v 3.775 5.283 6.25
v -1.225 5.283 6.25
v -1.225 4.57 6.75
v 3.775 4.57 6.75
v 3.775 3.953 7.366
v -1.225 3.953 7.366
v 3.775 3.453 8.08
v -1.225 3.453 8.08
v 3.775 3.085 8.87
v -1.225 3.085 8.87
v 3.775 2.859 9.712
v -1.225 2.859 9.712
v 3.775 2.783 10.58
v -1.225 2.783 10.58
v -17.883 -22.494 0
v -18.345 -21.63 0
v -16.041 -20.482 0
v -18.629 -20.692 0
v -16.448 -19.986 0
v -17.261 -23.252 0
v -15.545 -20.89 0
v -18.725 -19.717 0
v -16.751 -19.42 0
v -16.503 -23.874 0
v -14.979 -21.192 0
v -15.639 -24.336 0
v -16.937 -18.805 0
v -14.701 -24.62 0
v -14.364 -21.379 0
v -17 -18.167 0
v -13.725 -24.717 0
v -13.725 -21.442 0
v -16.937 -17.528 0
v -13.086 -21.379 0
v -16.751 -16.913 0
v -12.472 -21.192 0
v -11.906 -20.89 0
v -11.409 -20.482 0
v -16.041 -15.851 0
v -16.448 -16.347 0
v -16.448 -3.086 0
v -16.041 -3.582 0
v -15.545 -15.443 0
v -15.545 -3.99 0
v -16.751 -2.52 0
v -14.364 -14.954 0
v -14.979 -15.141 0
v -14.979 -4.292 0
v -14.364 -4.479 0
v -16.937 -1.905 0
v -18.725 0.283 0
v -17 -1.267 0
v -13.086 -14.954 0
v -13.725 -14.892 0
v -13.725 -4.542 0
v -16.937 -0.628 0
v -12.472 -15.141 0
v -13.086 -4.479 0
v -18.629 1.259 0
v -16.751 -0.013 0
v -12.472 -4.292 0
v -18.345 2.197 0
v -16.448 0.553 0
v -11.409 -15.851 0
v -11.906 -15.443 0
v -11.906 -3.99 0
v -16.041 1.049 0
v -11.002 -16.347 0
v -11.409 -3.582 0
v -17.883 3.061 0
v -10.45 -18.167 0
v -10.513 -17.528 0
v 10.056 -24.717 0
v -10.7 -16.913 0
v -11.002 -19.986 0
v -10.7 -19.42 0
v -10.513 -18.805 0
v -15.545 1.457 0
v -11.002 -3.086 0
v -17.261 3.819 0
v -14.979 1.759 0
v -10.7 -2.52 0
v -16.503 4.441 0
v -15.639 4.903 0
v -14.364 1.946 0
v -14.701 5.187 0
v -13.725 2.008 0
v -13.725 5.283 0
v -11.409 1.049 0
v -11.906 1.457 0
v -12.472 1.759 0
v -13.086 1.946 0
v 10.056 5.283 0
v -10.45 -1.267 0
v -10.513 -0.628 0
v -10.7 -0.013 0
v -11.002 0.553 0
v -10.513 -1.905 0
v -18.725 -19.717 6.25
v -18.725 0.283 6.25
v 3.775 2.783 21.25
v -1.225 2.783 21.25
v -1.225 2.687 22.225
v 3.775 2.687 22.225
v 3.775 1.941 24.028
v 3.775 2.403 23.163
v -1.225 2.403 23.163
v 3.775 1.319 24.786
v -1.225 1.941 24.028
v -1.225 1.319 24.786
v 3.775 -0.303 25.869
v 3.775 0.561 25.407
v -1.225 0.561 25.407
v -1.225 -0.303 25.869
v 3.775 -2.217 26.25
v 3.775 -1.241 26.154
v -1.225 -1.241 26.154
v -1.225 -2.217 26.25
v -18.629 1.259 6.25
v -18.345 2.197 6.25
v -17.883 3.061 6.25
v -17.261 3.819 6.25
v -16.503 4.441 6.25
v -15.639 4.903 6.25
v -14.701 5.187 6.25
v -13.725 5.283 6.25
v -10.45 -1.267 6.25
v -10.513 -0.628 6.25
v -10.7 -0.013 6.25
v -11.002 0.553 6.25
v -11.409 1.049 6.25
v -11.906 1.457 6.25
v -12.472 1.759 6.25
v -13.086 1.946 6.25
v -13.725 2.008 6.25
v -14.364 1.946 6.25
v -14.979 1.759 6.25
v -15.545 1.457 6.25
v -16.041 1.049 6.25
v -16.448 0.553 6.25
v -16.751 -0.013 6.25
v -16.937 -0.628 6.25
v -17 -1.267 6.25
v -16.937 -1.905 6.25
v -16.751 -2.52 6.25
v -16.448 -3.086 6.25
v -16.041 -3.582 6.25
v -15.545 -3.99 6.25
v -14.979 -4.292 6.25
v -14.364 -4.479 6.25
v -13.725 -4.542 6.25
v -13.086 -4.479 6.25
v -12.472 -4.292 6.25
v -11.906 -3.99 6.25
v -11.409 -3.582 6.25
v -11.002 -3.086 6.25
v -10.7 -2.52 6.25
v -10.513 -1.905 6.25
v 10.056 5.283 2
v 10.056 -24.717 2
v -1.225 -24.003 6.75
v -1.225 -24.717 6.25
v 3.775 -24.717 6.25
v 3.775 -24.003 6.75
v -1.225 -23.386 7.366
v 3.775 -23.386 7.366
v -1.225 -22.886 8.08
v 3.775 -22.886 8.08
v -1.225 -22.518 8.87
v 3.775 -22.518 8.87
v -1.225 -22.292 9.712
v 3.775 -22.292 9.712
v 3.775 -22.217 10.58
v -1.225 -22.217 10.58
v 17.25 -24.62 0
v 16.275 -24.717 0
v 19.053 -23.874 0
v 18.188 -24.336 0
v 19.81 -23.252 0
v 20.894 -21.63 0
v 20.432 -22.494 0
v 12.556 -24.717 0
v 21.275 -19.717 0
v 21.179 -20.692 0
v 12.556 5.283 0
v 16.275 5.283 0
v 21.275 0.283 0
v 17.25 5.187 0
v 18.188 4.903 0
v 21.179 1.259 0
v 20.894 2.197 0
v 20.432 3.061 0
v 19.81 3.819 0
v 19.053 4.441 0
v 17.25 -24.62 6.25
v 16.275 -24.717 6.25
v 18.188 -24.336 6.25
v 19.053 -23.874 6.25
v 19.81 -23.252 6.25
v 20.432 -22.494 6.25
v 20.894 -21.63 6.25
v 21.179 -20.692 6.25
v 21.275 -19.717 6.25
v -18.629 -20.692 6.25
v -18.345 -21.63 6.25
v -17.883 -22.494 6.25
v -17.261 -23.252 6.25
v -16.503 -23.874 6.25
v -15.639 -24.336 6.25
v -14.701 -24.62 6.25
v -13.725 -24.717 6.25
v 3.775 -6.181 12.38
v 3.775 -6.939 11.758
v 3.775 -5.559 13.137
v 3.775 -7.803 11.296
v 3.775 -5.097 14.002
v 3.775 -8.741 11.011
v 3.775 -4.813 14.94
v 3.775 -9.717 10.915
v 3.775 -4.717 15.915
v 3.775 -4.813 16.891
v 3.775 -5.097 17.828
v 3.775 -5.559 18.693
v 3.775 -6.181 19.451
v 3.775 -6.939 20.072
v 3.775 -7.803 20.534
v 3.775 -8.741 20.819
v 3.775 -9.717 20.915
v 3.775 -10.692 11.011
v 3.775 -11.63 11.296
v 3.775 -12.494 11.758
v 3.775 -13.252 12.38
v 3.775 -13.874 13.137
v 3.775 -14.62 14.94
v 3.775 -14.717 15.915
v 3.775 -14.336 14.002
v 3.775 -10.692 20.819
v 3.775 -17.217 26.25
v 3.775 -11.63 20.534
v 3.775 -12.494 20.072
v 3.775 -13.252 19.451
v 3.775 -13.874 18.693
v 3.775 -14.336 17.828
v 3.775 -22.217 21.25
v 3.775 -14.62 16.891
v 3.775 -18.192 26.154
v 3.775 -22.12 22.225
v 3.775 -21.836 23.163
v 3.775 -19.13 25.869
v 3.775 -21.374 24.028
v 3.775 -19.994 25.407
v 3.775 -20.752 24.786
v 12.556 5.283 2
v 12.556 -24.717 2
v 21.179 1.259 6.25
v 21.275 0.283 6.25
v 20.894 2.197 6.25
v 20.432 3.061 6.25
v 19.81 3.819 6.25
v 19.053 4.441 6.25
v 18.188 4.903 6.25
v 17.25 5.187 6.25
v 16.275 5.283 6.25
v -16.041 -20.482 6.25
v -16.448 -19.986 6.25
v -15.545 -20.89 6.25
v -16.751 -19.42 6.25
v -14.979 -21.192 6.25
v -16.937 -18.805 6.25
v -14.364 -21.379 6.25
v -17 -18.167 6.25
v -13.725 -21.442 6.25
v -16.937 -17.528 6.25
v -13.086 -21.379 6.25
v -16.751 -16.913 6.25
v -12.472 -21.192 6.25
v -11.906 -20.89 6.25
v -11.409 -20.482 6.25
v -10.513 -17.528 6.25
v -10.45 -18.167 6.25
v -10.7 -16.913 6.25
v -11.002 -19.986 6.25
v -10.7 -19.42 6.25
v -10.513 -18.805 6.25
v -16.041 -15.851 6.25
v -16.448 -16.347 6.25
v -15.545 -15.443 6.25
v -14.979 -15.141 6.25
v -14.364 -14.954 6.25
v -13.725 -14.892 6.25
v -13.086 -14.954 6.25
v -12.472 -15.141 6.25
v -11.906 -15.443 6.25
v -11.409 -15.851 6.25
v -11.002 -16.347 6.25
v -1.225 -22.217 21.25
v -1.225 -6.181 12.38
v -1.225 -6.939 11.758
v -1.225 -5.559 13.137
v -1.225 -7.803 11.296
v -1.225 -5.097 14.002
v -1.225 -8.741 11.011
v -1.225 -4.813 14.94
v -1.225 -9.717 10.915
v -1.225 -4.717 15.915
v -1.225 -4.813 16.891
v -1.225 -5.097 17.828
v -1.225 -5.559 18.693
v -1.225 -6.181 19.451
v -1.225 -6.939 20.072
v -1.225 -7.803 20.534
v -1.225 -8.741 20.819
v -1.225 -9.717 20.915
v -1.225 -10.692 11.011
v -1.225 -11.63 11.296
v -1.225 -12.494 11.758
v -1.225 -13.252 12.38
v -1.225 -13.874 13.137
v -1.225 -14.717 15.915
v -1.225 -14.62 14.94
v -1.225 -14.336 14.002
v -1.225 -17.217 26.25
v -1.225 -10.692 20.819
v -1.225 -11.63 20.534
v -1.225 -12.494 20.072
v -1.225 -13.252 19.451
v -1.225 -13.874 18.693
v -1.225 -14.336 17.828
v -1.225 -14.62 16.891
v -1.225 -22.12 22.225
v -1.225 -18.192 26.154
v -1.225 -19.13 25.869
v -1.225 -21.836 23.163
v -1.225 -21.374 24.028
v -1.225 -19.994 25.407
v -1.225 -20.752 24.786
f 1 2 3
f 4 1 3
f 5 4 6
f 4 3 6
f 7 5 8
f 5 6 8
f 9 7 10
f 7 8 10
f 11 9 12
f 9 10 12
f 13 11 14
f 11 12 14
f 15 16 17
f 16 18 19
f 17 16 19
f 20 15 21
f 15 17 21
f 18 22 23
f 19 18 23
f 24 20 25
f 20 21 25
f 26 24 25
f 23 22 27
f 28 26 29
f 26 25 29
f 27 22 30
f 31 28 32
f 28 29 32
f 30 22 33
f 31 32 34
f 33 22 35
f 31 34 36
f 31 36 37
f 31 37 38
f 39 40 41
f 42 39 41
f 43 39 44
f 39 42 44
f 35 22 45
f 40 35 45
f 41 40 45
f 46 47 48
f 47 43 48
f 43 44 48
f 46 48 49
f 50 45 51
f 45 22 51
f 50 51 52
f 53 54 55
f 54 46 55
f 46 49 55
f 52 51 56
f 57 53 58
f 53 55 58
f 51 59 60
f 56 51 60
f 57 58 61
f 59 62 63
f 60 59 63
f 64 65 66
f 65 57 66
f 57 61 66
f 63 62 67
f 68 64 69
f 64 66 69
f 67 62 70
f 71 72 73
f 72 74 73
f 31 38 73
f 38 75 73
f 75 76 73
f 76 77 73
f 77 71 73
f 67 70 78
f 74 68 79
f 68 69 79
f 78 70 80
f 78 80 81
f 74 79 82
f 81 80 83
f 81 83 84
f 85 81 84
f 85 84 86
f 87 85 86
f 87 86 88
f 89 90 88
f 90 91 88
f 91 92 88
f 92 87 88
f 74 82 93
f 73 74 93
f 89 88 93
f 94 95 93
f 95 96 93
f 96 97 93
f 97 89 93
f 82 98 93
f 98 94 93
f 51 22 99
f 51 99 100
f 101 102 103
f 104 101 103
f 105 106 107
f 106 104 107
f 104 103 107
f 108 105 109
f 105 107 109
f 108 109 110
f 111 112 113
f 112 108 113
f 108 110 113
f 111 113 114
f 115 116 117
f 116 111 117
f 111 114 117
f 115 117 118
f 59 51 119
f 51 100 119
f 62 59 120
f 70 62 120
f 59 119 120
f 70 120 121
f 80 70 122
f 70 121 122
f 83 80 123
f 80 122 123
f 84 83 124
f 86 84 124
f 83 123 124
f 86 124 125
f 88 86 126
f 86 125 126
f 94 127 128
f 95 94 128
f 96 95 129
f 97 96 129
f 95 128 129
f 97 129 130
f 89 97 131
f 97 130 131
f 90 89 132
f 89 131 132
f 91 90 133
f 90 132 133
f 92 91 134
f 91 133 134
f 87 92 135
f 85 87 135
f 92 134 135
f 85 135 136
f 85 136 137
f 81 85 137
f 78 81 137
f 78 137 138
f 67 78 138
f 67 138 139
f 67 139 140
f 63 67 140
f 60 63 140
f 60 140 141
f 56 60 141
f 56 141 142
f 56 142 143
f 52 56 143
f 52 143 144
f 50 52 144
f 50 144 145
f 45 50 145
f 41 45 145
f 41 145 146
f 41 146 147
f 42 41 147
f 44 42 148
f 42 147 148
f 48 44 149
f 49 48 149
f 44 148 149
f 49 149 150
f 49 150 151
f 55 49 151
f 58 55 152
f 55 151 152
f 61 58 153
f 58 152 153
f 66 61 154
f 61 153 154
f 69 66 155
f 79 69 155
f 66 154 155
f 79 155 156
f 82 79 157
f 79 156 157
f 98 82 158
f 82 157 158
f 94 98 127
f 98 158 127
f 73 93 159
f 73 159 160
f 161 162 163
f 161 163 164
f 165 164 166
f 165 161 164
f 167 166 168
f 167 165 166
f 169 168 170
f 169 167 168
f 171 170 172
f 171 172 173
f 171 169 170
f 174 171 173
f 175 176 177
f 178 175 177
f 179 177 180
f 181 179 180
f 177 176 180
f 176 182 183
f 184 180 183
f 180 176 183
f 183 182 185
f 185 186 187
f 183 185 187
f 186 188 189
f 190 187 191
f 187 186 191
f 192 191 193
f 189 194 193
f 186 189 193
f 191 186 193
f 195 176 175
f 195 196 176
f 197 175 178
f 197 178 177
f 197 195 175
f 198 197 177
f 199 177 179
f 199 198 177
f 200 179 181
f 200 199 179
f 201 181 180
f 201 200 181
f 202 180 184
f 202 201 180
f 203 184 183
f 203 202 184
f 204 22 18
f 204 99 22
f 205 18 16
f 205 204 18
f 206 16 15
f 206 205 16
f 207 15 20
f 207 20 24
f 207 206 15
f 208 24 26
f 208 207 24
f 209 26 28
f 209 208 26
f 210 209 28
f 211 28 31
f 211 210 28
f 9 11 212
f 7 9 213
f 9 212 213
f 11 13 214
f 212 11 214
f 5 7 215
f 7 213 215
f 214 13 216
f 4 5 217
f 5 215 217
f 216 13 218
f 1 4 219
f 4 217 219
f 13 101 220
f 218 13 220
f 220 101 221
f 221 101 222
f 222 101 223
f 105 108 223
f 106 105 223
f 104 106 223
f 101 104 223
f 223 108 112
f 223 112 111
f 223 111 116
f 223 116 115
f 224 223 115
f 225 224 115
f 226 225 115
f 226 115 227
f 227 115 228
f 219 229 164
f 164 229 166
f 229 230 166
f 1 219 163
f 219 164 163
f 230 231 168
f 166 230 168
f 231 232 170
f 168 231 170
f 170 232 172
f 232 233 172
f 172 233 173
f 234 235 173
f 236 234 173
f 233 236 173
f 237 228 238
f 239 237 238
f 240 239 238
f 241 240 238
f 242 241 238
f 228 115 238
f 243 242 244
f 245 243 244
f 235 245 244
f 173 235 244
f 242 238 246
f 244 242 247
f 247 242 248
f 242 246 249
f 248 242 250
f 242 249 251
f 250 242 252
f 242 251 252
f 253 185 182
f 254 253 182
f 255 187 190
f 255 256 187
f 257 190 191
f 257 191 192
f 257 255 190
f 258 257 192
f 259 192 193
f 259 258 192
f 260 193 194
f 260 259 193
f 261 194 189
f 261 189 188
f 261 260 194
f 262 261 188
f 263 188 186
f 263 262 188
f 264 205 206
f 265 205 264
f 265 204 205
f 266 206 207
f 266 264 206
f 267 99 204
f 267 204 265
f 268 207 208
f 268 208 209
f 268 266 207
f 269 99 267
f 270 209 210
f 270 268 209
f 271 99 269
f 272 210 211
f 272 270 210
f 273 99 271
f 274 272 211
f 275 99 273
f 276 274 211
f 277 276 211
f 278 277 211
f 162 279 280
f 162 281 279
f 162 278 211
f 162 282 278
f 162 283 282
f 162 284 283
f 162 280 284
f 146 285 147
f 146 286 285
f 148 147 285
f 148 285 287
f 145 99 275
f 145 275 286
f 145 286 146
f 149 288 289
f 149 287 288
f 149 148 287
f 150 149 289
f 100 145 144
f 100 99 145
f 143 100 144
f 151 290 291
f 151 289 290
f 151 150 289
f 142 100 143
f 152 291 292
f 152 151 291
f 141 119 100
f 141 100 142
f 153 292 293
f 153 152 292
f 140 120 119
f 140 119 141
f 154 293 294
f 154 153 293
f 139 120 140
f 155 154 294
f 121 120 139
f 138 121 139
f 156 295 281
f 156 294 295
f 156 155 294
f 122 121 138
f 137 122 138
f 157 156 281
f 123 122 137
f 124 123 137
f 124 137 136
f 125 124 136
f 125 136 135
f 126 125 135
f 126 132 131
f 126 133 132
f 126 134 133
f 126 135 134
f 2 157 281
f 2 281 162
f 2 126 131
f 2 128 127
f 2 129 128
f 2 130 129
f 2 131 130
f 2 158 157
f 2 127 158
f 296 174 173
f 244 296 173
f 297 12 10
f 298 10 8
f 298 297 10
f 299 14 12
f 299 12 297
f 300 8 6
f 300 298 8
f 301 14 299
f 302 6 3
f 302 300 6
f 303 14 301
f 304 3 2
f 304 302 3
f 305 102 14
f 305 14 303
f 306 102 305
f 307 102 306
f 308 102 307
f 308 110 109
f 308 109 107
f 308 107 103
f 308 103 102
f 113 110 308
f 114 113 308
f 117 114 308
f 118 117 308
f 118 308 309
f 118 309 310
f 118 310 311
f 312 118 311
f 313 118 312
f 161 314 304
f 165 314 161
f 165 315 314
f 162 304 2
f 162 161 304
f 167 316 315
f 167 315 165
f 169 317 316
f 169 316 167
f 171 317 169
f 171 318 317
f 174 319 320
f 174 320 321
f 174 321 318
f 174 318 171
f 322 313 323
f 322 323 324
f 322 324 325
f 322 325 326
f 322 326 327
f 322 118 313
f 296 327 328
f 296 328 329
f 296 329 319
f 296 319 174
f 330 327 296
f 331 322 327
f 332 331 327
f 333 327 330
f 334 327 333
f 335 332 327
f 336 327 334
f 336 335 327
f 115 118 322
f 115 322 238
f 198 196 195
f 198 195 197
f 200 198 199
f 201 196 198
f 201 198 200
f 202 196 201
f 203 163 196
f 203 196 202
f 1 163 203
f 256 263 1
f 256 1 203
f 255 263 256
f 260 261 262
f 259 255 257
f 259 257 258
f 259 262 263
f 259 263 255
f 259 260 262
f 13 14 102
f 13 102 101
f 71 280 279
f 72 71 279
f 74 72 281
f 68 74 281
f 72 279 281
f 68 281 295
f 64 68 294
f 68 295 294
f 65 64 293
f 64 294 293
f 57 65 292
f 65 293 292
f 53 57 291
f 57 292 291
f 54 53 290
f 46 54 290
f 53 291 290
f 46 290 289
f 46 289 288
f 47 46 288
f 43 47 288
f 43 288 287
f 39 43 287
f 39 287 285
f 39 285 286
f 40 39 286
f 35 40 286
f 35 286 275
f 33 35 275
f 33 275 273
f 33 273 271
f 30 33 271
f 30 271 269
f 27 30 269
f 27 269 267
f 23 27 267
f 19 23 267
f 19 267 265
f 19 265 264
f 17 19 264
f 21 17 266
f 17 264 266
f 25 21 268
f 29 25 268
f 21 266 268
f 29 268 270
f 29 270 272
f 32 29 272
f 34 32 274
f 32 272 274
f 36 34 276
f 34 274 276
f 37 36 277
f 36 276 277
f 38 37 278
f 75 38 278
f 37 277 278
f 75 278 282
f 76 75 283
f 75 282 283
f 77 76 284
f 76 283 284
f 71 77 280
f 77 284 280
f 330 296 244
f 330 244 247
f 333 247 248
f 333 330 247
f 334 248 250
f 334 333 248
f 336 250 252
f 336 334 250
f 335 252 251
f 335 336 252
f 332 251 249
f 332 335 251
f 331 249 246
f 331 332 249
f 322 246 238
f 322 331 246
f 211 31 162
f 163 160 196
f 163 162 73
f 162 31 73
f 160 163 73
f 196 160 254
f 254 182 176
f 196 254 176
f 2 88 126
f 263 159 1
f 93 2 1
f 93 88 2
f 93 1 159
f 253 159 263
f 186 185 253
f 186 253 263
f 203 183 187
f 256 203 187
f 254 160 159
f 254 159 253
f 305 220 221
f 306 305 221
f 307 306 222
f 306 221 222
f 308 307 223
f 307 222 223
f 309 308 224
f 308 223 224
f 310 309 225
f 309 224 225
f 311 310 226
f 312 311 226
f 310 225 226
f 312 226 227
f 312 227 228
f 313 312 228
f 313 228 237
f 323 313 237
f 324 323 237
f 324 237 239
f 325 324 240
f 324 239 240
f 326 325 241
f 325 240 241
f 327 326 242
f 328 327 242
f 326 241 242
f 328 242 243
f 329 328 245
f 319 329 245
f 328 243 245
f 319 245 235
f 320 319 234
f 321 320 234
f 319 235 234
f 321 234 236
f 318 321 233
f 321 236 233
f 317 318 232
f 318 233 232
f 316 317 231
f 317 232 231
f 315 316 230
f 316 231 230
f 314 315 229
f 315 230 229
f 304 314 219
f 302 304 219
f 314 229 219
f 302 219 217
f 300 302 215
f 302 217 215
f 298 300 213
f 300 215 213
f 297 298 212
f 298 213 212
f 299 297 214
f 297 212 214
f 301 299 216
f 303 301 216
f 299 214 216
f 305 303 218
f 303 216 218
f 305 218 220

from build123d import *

# Parameters (mm, degrees)
F0_W        = 40
F0_H        = 30
F1_DEPTH    = 6.25
F2_R        = 5
F3_W        = 5
F3_H        = 25
F4_DEPTH    = 20
F5_T1_DEPTH = 5
F5_T3_DEPTH = 5
F5_T5_DEPTH = 30
F5_T7_DEPTH = 30
F7_R        = 5
F8_DEPTH    = 5
F6_R        = 3.275
F9_DEPTH    = 25
F10_W       = 2.5
F10_H       = 30
F11_DEPTH   = 2


# Not quite as in the source:
# - a fillet or chamfer that OpenCascade refuses, or shapes differently, is made with other operations: its cross-section is extruded or revolved along the edge and cut away or added


with BuildPart() as f1:
    # F0 (on Top) → F1 (new body)
    with BuildSketch(Plane.XY):
        with Locations((1.2747282162, -9.7165126197)):
            Rectangle(F0_W, F0_H)
    extrude(amount=F1_DEPTH)

    # F2
    f2_edges = [f1.edges().sort_by_distance(p)[0] for p in [
        (-18.725272, -24.716513, 3.125),
        (21.274728, -24.716513, 3.125),
        (21.274728, 5.283487, 3.125),
        (-18.725272, 5.283487, 3.125),
    ]]
    fillet(f2_edges, radius=F2_R)

    # F3 (on face) → F4 (join)
    with BuildSketch(Plane.XY.offset(6.25)):
        with Locations((1.2747282162, -9.7165126197)):
            Rectangle(F3_W, F3_H)
    extrude(amount=F4_DEPTH)

    # F5: fillet of radius 5 on 4 edges, made by hand

    # F5_s2 → F5_t1 (join)
    with BuildSketch(Plane.YZ.offset(-1.2252717838)):
        with BuildLine():
            ThreePointArc((5.2834873803, 6.25), (3.4533603614, 8.0801270189), (2.7834873803, 10.5801270189))
            Line((2.7834873803, 10.5801270189), (2.7834873803, 6.25))
            Line((2.7834873803, 6.25), (5.2834873803, 6.25))
        make_face()
    extrude(amount=F5_T1_DEPTH)

    # F5_s4 → F5_t3 (join)
    with BuildSketch(Plane.YZ.offset(-1.2252717838)):
        with BuildLine():
            ThreePointArc((-24.7165126197, 6.25), (-22.8863856008, 8.0801270189), (-22.2165126197, 10.5801270189))
            Line((-22.2165126197, 10.5801270189), (-22.2165126197, 6.25))
            Line((-22.2165126197, 6.25), (-24.7165126197, 6.25))
        make_face()
    extrude(amount=F5_T3_DEPTH)

    # F5_s6 → F5_t5 (cut)
    with BuildSketch(Plane.YZ.offset(-13.7252717838)):
        with BuildLine():
            ThreePointArc((2.7834873803, 21.25), (1.3190212862, 24.7855339059), (-2.2165126197, 26.25))
            Line((-2.2165126197, 26.25), (2.7834873803, 26.25))
            Line((2.7834873803, 26.25), (2.7834873803, 21.25))
        make_face()
    extrude(amount=F5_T5_DEPTH, mode=Mode.SUBTRACT)

    # F5_s8 → F5_t7 (cut)
    with BuildSketch(Plane.YZ.offset(-13.7252717838)):
        with BuildLine():
            ThreePointArc((-22.2165126197, 21.25), (-20.7520465256, 24.7855339059), (-17.2165126197, 26.25))
            Line((-17.2165126197, 26.25), (-22.2165126197, 26.25))
            Line((-22.2165126197, 26.25), (-22.2165126197, 21.25))
        make_face()
    extrude(amount=F5_T7_DEPTH, mode=Mode.SUBTRACT)

    # F7 (on face) → F8 (cut)
    with BuildSketch(Plane.YZ.offset(3.7747282162)):
        with Locations((-9.7165126197, 15.9150635095)):
            Circle(F7_R)
    extrude(amount=-F8_DEPTH, mode=Mode.SUBTRACT)

    # F6 (on face) → F9 (cut)
    with BuildSketch(Plane.XY.offset(6.25)):
        with Locations((-13.7252717838, -1.2665126197)):
            Circle(F6_R)
        with Locations((-13.7252717838, -18.1665126197)):
            Circle(F6_R)
    extrude(amount=-F9_DEPTH, mode=Mode.SUBTRACT)

    # F10 (on face) → F11 (cut)
    with BuildSketch(Plane(origin=(0, 0, 0), x_dir=(1, 0, 0), z_dir=(0, 0, -1))):
        with Locations((11.3062032312, 9.7165126197)):
            Rectangle(F10_W, F10_H)
    extrude(amount=-F11_DEPTH, mode=Mode.SUBTRACT)


solid = f1.part
